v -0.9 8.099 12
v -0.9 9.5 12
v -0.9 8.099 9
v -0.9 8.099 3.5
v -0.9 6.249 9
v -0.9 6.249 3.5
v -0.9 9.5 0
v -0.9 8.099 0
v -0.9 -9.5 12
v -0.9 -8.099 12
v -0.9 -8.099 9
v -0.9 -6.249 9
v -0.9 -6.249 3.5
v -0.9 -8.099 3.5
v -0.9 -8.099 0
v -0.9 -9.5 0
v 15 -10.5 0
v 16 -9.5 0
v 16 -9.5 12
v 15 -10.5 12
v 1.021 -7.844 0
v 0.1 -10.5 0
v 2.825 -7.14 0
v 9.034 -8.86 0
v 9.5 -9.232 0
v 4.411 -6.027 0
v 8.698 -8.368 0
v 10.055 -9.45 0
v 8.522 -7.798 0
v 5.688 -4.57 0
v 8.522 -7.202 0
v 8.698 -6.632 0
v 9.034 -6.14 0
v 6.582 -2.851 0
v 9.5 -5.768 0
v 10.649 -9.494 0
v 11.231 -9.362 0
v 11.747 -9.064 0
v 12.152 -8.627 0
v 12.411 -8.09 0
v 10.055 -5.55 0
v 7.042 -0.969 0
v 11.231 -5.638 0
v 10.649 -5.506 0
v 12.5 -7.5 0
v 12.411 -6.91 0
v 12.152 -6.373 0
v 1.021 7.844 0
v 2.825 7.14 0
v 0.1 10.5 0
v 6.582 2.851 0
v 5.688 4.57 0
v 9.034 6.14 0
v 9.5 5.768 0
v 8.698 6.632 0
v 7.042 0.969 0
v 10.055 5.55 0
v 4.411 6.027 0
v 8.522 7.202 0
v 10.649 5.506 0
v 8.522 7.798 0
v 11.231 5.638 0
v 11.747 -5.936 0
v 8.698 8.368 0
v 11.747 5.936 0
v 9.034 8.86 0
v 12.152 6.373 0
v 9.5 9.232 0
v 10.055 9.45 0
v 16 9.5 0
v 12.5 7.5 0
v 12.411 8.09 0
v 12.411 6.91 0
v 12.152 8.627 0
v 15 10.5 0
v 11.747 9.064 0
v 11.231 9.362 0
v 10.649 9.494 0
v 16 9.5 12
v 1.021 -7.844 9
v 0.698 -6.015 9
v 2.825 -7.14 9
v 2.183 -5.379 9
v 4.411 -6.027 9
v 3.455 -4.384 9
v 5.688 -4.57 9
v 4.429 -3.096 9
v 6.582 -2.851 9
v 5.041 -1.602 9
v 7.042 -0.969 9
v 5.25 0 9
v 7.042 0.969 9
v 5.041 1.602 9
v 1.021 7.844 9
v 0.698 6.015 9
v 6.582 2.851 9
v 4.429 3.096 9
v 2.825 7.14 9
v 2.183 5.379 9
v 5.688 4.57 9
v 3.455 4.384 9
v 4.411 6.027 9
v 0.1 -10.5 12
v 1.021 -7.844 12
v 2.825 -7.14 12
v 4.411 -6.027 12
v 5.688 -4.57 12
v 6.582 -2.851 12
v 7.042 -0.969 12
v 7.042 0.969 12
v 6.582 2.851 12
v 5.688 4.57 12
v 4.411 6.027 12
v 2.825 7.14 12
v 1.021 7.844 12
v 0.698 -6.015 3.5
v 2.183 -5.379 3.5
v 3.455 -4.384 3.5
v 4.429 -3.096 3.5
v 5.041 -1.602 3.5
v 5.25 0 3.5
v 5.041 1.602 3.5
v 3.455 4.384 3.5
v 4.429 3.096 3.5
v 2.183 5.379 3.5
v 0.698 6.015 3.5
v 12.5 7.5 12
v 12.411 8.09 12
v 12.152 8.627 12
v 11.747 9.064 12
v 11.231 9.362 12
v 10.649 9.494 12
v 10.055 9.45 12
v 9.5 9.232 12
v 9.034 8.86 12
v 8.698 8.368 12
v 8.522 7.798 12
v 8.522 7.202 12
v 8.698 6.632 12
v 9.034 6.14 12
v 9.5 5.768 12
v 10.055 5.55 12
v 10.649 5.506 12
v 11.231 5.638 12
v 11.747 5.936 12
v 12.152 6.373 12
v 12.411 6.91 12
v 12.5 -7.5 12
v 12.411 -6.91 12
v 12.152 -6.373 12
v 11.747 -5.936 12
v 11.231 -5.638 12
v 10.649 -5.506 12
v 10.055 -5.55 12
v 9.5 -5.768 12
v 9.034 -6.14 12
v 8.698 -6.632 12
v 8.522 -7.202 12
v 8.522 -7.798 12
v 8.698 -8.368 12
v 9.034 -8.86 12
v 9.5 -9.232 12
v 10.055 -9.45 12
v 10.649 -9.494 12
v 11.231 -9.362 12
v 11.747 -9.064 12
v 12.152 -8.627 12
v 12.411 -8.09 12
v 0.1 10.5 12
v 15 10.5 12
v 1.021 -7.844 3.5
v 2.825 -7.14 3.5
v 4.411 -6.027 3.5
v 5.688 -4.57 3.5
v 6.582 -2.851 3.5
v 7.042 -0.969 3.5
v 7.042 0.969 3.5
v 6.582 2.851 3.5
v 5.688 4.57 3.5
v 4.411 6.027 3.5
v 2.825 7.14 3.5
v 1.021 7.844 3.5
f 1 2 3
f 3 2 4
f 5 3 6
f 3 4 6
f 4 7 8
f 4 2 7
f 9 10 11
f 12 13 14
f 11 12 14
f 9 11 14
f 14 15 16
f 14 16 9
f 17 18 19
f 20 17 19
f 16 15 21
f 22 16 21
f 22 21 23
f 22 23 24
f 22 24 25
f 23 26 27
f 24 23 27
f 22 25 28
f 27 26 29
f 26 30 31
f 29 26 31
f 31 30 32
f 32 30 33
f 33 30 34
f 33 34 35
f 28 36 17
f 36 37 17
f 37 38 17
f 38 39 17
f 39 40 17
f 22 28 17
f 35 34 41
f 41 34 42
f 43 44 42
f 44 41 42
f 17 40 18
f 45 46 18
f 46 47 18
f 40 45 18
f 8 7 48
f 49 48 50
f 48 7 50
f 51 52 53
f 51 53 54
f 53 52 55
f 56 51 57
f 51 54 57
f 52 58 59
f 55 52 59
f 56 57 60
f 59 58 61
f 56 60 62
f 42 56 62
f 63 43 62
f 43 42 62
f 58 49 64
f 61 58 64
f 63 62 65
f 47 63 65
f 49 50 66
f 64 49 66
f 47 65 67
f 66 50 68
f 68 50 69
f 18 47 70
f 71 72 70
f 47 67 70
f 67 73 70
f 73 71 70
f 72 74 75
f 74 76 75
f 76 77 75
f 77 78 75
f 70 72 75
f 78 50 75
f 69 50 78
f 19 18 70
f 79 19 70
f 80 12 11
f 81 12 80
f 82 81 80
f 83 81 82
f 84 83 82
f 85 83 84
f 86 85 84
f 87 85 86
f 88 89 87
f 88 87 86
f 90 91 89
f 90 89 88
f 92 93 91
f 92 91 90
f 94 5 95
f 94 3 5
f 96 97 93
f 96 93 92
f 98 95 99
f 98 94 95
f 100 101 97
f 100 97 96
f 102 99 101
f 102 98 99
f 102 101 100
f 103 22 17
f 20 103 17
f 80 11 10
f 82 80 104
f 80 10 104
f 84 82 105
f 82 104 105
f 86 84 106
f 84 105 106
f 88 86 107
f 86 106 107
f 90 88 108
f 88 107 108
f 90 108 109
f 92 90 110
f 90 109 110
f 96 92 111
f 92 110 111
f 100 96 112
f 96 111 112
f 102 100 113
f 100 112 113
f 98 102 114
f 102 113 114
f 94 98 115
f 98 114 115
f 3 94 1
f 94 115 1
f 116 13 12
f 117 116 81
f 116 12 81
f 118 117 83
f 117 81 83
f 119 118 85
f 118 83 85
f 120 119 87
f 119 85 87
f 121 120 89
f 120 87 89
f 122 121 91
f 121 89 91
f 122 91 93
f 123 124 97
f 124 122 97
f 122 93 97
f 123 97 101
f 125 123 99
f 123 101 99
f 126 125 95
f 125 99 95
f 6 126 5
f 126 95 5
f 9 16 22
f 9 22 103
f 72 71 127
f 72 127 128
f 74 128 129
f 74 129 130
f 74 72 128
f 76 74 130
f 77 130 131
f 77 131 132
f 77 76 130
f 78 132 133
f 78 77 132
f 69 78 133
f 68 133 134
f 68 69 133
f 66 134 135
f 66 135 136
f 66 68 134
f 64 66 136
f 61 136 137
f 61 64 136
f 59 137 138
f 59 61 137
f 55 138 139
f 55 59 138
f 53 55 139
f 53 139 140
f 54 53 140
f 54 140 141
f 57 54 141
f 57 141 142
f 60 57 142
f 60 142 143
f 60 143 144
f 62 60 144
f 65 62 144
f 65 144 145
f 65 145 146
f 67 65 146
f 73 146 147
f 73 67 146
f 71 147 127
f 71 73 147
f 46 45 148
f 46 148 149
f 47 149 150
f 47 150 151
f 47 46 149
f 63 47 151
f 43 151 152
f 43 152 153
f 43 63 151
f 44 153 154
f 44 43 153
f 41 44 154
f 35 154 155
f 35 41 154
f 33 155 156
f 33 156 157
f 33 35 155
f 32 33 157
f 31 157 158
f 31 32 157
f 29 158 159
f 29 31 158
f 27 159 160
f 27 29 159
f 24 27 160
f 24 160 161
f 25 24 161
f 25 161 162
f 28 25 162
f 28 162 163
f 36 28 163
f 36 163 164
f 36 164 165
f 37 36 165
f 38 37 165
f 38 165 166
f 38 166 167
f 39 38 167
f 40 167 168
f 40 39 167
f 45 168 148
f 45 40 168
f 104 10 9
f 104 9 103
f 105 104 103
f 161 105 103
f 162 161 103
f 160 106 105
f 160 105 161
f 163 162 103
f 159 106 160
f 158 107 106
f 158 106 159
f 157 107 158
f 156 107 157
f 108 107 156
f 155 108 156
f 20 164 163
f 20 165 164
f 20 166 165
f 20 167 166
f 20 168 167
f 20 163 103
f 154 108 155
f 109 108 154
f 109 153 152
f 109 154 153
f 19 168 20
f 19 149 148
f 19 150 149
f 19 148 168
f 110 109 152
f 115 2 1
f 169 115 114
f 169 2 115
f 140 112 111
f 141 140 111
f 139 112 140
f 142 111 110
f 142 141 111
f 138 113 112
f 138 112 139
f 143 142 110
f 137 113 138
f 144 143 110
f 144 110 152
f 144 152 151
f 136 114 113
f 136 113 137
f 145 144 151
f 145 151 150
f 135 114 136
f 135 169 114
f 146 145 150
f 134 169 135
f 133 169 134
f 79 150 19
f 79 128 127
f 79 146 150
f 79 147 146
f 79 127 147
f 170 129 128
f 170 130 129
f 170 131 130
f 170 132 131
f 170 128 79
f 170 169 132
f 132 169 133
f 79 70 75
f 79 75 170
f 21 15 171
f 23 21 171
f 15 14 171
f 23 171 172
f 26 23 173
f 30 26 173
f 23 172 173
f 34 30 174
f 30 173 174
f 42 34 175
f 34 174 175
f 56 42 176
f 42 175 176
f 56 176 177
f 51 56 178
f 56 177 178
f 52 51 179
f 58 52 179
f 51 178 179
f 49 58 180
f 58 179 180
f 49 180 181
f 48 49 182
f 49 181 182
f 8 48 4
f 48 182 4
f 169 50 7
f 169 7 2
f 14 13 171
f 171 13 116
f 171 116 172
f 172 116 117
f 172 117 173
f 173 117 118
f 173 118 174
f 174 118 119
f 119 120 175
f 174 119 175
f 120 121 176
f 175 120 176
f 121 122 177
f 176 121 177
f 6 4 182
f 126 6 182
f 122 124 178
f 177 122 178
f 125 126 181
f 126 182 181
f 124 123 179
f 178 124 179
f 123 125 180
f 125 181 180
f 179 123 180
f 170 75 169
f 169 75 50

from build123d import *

# Parameters (mm, degrees)
F0_R     = 2
F1_DEPTH = 12
F2_R     = 8.1
F3_DEPTH = 3
F4_R     = 6.25
F5_DEPTH = 5.5
F6_R     = 8.1
F7_DEPTH = 25
F8_SIZE  = 1


with BuildPart() as f1:
    # F0 (on Top) → F1 (new body)
    with BuildSketch(Plane.XY):
        with BuildLine():
            Line((-0.9, -10.5), (16, -10.5))
            Line((16, -10.5), (16, 10.5))
            Line((16, 10.5), (-0.9, 10.5))
            Line((-0.9, 10.5), (-0.9, 0.9949874371))
            ThreePointArc((-0.9, 0.9949874371), (0, 0), (-0.9, -0.9949874371))
            Line((-0.9, -0.9949874371), (-0.9, -10.5))
        make_face()
        with Locations((10.5, -7.5)):
            Circle(F0_R, mode=Mode.SUBTRACT)
        with Locations((10.5, 7.5)):
            Circle(F0_R, mode=Mode.SUBTRACT)
    extrude(amount=F1_DEPTH)

    # F2 (on face) → F3 (cut)
    with BuildSketch(Plane.XY.offset(12)):
        with Locations((-1, 0)):
            Circle(F2_R)
    extrude(amount=-F3_DEPTH, mode=Mode.SUBTRACT)

    # F4 (on face) → F5 (cut)
    with BuildSketch(Plane.XY.offset(9)):
        with Locations((-1, 0)):
            Circle(F4_R)
    extrude(amount=-F5_DEPTH, mode=Mode.SUBTRACT)

    # F6 (on face) → F7 (cut)
    with BuildSketch(Plane.XY.offset(3.5)):
        with Locations((-1, 0)):
            Circle(F6_R)
    extrude(amount=-F7_DEPTH, mode=Mode.SUBTRACT)

    # F8
    f8_edges = [f1.edges().sort_by_distance(p)[0] for p in [
        (16, 10.5, 6),
        (16, -10.5, 6),
        (-0.9, -10.5, 6),
        (-0.9, 10.5, 6),
    ]]
    chamfer(f8_edges, length=F8_SIZE)


solid = f1.part
